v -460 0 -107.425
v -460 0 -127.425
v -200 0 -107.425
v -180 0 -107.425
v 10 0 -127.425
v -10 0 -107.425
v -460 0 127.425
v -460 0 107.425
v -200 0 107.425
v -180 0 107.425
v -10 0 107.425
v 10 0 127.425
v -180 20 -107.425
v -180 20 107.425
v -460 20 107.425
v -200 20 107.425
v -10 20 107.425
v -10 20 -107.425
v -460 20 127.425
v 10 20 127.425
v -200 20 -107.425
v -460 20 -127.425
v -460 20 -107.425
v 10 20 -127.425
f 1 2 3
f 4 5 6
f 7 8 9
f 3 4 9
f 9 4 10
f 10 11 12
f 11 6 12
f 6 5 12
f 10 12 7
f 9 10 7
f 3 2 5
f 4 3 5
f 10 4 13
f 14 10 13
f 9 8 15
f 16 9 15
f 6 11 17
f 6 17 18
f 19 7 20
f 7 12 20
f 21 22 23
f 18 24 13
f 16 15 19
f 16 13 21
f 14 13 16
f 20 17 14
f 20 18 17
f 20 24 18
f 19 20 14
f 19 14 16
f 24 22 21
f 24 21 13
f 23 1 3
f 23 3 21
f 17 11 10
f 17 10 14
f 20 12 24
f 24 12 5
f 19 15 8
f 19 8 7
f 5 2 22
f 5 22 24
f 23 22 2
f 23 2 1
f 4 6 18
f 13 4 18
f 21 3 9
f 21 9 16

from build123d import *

# Parameters (mm, degrees)
SKETCH1_W           = 20
SKETCH1_H           = 254.85
BOSS_EXTRUDE1_DEPTH = 20
SKETCH3_W           = 20
SKETCH3_H           = 20
BOSS_EXTRUDE2_DEPTH = 450
SKETCH5_W           = 20
SKETCH5_H           = 20
BOSS_EXTRUDE4_DEPTH = 214.85


with BuildPart() as part:
    # Sketch1 → Boss-Extrude1 (new body)
    with BuildSketch(Plane(origin=(0, 0, 0), x_dir=(1, 0, 0), z_dir=(0, 1, 0))):
        Rectangle(SKETCH1_W, SKETCH1_H)
    extrude(amount=BOSS_EXTRUDE1_DEPTH)

    # Sketch3 → Boss-Extrude2 (add)
    with BuildSketch(Plane.ZY.offset(10)):
        with Locations((117.425, 10)):
            Rectangle(SKETCH3_W, SKETCH3_H)
        with Locations((-117.425, 10)):
            Rectangle(SKETCH3_W, SKETCH3_H)
    extrude(amount=BOSS_EXTRUDE2_DEPTH)

    # Sketch5 → Boss-Extrude4 (add)
    with BuildSketch(Plane.XY.offset(-107.425)):
        with Locations((-190, 10)):
            Rectangle(SKETCH5_W, SKETCH5_H)
    extrude(amount=BOSS_EXTRUDE4_DEPTH)


solid = part.part
